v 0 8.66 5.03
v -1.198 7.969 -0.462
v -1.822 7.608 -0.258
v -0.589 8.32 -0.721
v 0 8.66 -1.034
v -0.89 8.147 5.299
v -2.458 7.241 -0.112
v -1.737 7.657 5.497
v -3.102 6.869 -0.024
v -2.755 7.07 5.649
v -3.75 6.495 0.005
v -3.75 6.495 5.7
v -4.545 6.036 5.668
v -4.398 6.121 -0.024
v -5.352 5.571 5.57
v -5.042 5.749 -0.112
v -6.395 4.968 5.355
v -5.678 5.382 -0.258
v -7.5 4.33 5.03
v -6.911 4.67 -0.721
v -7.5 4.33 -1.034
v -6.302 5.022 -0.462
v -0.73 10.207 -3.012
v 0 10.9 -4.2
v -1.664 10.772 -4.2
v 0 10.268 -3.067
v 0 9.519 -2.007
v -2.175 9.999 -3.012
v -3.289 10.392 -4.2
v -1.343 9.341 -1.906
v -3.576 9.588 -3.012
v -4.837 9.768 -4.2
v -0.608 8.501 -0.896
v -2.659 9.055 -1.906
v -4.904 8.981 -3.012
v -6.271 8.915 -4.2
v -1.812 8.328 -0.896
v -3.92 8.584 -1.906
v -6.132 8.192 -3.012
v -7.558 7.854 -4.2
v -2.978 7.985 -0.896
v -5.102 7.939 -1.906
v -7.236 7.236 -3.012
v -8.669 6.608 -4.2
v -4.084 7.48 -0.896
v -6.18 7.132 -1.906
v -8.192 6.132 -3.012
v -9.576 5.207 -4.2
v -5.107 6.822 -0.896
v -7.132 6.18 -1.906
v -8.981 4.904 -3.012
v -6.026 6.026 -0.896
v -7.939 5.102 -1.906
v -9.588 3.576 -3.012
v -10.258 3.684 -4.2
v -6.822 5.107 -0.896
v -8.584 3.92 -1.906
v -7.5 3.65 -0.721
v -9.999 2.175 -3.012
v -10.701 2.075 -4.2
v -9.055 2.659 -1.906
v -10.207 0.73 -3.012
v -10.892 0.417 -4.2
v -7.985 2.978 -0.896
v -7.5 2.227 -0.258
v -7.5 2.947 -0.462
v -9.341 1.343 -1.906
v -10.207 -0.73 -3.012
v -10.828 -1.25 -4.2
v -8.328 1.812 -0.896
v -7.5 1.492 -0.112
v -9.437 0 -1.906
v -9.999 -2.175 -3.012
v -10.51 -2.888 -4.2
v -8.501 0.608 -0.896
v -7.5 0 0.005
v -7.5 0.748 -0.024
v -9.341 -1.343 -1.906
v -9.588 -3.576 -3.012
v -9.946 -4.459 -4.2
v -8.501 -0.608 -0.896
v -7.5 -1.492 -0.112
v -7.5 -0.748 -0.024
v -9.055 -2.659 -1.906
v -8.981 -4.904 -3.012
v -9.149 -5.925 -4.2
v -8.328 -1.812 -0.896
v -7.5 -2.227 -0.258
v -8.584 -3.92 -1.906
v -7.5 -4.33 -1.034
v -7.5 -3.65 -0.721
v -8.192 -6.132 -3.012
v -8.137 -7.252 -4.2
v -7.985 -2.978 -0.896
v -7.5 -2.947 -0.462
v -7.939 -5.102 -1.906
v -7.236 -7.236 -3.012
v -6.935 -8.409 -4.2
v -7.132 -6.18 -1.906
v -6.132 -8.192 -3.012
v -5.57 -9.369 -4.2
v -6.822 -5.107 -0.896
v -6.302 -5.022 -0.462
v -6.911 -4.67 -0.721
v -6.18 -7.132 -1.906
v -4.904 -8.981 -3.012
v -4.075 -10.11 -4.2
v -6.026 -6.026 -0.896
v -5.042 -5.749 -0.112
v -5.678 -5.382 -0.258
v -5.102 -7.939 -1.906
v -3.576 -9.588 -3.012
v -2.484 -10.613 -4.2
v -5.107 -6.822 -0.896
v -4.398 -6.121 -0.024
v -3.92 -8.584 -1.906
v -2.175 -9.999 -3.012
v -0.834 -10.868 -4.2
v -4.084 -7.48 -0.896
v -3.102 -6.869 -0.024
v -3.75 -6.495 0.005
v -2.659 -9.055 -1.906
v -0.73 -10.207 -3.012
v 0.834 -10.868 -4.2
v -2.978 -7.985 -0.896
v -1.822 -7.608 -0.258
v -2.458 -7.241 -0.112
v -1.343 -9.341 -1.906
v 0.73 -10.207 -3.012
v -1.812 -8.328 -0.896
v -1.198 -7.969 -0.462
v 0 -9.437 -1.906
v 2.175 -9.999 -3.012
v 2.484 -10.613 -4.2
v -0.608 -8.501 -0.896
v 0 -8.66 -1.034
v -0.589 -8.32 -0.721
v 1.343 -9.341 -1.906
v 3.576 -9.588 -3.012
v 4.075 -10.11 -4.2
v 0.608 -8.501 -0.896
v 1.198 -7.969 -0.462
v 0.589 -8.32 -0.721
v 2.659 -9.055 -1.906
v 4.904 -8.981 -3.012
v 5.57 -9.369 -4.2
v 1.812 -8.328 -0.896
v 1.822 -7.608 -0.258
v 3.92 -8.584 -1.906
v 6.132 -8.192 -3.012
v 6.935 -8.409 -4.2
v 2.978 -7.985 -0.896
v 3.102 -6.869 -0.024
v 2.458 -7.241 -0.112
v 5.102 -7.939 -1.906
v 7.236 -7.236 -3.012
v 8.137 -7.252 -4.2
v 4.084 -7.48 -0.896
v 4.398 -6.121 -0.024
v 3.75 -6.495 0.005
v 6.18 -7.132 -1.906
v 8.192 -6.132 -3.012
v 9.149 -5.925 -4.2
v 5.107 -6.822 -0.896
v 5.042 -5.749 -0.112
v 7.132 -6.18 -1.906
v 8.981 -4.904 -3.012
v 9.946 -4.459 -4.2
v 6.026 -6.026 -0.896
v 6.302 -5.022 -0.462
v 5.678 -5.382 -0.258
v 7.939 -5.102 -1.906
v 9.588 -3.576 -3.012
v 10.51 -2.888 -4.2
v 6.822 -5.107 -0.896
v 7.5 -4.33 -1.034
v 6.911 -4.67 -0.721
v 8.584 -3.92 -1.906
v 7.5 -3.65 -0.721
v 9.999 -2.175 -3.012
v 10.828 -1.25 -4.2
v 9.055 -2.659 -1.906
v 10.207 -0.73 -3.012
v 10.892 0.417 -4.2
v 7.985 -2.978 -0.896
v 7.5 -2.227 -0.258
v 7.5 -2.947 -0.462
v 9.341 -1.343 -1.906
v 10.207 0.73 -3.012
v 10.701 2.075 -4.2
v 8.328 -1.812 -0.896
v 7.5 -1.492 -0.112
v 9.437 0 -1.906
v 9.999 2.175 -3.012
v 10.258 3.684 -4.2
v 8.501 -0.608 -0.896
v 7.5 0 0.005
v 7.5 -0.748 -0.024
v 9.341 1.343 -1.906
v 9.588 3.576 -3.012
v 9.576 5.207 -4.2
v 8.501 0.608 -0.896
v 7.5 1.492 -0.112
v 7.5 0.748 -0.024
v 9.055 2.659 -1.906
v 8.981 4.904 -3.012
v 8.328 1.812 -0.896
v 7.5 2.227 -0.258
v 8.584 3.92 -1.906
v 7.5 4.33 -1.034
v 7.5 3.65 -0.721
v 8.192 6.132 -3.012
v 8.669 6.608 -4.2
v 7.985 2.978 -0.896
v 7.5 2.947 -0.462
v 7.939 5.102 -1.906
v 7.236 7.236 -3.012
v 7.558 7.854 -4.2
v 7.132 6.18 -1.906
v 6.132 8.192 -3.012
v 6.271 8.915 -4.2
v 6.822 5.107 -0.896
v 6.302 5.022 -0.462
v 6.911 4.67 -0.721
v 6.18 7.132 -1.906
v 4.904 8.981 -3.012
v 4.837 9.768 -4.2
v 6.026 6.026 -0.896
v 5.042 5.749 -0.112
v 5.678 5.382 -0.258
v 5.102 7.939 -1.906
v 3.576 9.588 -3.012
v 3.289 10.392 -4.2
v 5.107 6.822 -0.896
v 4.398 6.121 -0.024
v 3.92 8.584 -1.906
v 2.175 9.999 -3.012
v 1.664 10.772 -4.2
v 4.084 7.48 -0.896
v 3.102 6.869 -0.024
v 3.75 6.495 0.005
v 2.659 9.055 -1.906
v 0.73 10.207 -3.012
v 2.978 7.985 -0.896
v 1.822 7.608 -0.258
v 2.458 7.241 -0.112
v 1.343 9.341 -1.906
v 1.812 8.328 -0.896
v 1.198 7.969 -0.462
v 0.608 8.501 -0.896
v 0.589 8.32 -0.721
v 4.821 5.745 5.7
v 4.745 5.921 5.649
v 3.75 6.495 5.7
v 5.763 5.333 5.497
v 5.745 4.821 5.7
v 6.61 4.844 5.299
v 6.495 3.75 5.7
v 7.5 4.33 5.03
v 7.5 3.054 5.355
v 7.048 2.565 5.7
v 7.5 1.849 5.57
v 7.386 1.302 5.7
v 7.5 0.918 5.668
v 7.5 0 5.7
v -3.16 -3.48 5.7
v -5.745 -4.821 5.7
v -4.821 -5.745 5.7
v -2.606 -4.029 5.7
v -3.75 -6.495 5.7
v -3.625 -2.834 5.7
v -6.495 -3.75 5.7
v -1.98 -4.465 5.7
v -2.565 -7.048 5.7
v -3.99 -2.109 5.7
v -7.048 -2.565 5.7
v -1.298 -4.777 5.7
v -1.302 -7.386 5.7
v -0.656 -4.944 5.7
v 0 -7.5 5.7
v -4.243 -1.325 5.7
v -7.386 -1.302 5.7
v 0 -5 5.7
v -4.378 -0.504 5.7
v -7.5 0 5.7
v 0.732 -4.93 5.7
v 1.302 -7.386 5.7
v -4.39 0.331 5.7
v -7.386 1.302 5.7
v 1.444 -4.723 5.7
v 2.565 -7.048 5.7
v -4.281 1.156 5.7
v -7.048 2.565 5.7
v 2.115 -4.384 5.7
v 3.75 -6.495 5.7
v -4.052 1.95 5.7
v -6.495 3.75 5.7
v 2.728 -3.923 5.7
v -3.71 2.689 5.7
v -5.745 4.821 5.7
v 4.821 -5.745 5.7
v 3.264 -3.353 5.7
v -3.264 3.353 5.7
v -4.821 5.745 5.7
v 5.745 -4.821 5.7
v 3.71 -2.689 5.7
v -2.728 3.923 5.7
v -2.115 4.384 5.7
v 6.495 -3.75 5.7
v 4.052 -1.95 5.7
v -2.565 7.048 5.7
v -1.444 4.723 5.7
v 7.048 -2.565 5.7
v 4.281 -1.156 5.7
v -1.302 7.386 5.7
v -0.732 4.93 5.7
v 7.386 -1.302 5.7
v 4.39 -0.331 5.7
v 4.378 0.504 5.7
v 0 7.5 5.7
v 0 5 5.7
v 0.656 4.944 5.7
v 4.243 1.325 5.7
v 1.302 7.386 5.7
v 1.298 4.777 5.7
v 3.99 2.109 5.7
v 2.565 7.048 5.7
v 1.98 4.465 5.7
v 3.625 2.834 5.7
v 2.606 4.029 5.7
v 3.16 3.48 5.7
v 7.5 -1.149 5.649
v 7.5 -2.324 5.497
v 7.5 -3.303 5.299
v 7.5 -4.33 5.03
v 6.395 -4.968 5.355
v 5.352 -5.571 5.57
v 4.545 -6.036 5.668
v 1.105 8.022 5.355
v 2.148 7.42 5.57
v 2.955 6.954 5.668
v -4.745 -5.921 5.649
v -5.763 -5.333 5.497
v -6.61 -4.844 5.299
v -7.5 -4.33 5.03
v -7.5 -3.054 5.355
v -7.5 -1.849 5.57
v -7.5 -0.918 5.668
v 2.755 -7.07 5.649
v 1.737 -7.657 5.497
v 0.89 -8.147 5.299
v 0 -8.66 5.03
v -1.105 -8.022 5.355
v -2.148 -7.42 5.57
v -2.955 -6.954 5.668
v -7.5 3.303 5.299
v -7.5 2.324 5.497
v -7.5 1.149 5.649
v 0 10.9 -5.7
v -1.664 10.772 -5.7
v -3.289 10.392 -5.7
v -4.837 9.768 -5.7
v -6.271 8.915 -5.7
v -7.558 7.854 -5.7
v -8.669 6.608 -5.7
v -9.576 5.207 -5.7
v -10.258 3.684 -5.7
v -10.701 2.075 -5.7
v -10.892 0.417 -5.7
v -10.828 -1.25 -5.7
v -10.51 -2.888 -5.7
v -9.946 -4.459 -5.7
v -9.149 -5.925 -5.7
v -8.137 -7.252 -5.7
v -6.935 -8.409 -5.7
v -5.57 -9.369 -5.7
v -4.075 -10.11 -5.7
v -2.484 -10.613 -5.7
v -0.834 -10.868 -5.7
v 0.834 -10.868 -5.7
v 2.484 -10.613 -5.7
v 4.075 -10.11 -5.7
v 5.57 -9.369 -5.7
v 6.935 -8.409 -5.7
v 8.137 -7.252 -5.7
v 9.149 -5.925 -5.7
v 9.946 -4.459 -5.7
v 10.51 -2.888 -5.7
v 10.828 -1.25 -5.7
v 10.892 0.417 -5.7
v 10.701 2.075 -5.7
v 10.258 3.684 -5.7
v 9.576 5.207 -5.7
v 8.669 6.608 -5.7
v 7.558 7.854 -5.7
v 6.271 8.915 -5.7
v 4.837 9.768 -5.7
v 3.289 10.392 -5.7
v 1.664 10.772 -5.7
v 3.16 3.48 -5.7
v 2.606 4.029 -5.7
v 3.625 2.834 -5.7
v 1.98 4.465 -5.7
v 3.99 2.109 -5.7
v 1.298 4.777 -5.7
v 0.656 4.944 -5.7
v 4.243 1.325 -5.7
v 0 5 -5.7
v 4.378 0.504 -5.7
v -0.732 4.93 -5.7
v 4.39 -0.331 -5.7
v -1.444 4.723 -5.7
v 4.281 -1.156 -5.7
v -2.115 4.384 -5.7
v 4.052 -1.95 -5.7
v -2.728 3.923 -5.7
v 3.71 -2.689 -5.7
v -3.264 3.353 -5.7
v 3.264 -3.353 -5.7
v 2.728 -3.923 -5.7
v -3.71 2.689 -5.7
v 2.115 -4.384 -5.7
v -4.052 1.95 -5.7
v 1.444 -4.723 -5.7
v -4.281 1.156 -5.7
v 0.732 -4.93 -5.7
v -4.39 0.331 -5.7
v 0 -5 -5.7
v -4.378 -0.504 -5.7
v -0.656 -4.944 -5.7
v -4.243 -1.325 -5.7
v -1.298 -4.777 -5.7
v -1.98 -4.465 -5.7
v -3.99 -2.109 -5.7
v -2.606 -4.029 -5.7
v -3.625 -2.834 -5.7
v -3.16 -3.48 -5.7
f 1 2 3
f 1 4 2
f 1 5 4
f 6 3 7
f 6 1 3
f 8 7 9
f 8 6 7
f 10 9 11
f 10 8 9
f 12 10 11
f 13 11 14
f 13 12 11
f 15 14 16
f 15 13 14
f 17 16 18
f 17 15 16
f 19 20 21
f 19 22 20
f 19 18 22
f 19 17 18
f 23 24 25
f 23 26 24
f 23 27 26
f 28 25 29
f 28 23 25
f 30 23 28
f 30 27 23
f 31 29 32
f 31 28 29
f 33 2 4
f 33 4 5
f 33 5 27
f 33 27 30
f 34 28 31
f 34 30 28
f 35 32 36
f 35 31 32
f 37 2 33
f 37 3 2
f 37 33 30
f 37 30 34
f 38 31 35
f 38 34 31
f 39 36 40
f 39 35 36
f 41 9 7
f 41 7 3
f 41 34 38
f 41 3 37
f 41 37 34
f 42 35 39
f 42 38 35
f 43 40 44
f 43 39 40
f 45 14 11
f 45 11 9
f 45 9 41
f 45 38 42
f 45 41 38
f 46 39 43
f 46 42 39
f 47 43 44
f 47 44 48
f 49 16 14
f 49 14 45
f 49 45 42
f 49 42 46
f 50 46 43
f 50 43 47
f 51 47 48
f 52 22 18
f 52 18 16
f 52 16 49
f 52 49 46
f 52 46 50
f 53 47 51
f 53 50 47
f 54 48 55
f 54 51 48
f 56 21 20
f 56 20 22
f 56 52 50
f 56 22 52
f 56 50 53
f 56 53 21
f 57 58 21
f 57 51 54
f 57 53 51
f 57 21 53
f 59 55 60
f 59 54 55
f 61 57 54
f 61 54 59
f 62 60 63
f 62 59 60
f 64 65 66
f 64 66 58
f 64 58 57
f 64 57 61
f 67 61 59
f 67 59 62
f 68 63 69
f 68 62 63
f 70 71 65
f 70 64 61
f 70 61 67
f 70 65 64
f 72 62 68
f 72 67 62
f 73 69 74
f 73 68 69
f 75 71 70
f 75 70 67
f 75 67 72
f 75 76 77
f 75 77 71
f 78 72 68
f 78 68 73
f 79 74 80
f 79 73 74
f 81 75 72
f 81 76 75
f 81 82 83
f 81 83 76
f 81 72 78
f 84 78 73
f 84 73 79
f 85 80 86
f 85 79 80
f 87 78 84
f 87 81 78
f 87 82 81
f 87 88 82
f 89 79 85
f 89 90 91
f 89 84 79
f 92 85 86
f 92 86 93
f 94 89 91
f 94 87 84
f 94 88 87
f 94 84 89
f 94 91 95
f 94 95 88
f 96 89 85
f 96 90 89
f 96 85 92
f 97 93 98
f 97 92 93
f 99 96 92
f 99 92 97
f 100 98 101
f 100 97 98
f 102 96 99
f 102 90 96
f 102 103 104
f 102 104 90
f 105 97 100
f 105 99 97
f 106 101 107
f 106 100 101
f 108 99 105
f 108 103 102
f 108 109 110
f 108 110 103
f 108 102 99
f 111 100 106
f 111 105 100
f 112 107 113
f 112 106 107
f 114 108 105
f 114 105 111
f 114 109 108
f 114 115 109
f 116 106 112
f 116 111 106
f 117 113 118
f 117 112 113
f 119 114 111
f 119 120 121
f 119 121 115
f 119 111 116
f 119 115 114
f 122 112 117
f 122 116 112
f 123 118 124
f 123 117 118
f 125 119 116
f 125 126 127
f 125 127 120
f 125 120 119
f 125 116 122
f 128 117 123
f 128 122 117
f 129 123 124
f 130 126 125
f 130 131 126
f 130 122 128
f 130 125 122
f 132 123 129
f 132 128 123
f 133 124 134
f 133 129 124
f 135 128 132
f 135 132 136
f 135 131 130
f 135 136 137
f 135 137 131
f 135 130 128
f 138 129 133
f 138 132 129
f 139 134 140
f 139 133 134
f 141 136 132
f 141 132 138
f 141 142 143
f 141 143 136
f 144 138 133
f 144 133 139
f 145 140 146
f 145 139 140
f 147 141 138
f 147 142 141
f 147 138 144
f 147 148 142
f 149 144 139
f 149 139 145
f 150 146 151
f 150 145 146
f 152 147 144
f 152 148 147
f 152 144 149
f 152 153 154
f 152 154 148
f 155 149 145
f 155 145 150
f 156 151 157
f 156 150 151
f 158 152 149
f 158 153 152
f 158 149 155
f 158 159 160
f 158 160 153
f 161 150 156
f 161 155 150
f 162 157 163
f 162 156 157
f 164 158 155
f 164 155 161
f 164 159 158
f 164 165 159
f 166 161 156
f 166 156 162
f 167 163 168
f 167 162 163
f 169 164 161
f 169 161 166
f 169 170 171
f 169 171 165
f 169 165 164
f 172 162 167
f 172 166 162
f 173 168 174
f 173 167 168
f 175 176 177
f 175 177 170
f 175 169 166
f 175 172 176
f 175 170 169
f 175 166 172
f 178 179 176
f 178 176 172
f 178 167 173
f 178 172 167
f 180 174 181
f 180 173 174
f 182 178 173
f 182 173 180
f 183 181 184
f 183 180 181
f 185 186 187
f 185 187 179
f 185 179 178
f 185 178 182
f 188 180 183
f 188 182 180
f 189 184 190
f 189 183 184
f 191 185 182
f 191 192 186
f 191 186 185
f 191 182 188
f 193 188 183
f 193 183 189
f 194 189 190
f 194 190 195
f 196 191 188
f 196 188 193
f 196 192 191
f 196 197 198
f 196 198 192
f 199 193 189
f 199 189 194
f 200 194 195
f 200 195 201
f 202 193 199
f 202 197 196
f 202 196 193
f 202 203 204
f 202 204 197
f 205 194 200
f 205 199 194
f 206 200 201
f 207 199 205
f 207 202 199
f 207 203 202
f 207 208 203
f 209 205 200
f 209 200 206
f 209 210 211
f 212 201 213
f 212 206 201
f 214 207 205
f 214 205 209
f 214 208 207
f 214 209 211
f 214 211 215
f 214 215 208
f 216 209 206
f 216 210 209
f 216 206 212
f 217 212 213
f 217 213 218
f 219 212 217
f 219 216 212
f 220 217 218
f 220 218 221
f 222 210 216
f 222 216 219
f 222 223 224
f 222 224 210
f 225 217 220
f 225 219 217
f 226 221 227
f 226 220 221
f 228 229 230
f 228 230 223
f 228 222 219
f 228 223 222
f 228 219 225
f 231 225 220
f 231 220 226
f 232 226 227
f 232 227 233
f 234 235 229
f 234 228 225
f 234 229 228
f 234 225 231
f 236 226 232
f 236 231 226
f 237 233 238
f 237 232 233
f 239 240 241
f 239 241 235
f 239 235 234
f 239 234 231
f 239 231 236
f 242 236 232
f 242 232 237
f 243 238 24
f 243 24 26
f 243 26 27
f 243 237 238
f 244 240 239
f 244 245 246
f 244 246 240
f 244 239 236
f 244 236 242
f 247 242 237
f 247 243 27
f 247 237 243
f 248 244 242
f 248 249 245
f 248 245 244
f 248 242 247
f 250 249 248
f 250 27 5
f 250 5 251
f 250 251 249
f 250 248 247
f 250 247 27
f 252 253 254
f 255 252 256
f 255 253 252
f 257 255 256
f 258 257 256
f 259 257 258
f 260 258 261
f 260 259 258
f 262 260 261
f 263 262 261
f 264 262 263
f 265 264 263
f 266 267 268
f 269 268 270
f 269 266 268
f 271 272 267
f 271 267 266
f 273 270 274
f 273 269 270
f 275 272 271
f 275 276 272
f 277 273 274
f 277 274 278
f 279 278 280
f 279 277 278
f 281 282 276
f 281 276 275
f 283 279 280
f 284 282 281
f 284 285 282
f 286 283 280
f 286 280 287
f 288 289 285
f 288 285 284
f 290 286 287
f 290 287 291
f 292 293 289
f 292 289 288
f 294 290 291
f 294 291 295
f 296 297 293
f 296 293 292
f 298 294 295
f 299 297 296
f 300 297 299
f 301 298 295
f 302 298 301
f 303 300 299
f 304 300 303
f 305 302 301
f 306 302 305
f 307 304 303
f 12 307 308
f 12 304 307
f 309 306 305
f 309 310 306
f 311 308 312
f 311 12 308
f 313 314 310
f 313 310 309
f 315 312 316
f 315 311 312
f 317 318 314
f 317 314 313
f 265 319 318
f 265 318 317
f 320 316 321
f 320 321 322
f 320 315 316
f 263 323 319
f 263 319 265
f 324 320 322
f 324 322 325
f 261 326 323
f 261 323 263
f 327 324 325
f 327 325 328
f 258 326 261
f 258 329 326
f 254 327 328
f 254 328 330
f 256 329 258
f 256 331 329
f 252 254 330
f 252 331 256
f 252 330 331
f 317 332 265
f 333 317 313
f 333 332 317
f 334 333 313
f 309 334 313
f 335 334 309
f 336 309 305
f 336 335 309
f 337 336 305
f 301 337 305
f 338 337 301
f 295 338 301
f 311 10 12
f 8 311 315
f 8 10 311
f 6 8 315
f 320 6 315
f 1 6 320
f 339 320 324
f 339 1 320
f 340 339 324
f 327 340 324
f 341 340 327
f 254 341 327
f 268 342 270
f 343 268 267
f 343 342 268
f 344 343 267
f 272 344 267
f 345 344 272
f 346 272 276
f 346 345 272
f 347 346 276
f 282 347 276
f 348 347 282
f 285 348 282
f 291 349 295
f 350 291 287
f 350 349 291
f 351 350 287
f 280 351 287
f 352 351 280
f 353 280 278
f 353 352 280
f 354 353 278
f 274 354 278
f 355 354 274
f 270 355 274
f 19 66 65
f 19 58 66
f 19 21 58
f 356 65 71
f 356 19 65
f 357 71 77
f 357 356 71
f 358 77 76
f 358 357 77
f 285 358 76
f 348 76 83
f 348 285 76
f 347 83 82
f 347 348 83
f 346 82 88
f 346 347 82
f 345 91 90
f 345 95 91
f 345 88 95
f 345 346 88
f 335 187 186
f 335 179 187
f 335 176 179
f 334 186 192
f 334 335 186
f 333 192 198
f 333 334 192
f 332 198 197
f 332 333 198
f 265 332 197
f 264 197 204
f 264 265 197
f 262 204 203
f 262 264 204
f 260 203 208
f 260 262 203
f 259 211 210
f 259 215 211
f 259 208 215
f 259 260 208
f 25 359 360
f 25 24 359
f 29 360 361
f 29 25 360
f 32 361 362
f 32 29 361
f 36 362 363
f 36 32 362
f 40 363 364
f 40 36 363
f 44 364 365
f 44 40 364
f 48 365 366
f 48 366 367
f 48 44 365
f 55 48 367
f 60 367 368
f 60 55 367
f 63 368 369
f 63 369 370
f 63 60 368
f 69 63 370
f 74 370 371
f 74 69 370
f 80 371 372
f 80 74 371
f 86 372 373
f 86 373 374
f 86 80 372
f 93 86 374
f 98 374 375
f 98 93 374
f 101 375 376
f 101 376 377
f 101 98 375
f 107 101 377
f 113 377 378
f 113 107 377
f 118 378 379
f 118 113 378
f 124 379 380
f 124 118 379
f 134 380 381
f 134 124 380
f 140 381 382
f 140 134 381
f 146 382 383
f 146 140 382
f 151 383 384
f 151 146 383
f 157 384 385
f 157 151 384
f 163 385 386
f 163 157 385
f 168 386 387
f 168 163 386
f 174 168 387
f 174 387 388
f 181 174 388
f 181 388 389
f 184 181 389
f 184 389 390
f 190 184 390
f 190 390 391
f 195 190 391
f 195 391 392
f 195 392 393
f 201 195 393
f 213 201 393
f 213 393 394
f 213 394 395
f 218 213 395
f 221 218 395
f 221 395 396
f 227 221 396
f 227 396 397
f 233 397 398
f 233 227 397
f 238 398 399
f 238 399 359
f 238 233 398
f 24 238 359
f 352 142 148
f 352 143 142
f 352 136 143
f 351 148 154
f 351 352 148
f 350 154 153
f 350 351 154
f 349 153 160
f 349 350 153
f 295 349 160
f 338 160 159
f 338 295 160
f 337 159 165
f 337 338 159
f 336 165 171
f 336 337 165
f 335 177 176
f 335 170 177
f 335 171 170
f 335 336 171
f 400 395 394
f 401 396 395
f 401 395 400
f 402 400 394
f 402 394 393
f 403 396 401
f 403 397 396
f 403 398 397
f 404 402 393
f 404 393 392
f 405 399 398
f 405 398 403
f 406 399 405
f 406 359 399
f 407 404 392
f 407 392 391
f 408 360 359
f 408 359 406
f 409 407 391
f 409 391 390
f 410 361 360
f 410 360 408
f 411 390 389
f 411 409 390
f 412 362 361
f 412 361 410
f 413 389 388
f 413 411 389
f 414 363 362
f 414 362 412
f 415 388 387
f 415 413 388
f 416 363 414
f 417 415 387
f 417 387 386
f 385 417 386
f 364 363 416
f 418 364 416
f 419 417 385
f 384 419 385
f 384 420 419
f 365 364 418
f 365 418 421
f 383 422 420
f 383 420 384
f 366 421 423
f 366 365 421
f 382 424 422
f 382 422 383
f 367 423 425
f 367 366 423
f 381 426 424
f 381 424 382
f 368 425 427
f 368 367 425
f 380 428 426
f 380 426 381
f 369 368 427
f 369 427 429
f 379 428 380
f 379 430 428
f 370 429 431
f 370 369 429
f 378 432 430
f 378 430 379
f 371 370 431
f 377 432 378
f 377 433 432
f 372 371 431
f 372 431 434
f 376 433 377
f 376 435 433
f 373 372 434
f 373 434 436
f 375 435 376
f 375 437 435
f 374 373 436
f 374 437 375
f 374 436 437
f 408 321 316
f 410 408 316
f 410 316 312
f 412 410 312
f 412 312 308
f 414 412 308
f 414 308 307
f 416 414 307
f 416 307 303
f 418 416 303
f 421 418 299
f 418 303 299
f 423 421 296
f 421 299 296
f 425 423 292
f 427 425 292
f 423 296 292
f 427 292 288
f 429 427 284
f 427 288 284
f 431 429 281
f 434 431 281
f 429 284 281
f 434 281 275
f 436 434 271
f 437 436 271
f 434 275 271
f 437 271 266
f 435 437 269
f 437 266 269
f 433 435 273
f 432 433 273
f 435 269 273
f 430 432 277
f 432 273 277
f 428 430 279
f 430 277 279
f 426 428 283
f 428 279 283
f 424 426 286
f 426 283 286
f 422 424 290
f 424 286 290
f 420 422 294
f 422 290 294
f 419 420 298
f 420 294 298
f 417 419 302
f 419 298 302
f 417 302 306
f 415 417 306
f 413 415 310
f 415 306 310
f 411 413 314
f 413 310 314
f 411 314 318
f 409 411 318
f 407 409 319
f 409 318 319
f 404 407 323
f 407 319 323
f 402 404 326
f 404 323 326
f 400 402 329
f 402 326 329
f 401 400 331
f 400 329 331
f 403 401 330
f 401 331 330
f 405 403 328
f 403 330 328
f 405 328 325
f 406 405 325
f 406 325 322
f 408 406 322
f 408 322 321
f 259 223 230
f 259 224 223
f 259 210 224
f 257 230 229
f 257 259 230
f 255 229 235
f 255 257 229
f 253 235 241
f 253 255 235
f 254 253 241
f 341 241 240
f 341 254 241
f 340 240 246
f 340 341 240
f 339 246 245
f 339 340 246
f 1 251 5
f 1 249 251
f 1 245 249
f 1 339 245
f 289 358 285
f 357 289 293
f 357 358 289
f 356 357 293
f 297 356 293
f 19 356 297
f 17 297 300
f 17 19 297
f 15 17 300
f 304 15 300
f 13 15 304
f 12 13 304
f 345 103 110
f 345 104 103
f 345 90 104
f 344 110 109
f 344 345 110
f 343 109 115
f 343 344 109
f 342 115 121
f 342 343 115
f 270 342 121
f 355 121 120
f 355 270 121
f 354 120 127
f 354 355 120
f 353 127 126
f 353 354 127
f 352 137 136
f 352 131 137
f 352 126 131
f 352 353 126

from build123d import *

# Parameters (mm, degrees)
EXTRUDE1_DEPTH      = 5.7
SKETCH2_OUTSIDE_W   = 73.328
SKETCH2_OUTSIDE_H   = 73.328
SKETCH2_OUTSIDE_R   = 7.5
CUT_EXTRUDE1_DEPTH  = 12.4
CUT_EXTRUDE1_TAPER  = 60
SKETCH5_R           = 5
CUT_EXTRUDE10_DEPTH = 12.4
SKETCH16_R          = 7.5
SKETCH16_RX         = 5
SKETCH16_RY         = 4.4
EXTRUDE2_DEPTH      = 11.4


with BuildPart() as part:
    # Sketch20 → Extrude1 (new body, symmetric)
    with BuildSketch(Plane.XY):
        Polygon((7.5, -4.330127019), (7.5, 4.330127019), (0, 8.660254038), (-7.5, 4.330127019), (-7.5, -4.330127019), (0, -8.660254038), align=None)
    extrude(amount=EXTRUDE1_DEPTH, both=True)

    # Sketch18 → Revolve1 (revolve)
    with BuildSketch(Plane(origin=(0, 0, 0), x_dir=(0, 0, -1), z_dir=(1, 0, 0))):
        with BuildLine():
            Line((5.7, 0), (5.7, 10.9))
            Line((5.7, 10.9), (4.2, 10.9))
            ThreePointArc((4.2, 10.9), (-0.760606441, 6.423589339), (-2.6, 0))
            Line((-2.6, 0), (5.7, 0))
        make_face()
    revolve(axis=Axis((0, 0, -5.7), (0, 0, 1)))

    # Sketch2 outside → Cut-Extrude1 (cut, through all)
    with BuildSketch(Plane.XY.offset(5.7)):
        Rectangle(SKETCH2_OUTSIDE_W, SKETCH2_OUTSIDE_H)
        Circle(SKETCH2_OUTSIDE_R, mode=Mode.SUBTRACT)
    extrude(amount=-CUT_EXTRUDE1_DEPTH, taper=CUT_EXTRUDE1_TAPER, mode=Mode.SUBTRACT)

    # Sketch5 → Cut-Extrude10 (cut, through all)
    with BuildSketch(Plane(origin=(0, 0, 5.7), x_dir=(-1, 0, 0), z_dir=(0, 0, -1))):
        Circle(SKETCH5_R)
    extrude(amount=CUT_EXTRUDE10_DEPTH, mode=Mode.SUBTRACT)

    # Sketch16 → Extrude2 (add)
    with BuildSketch(Plane.XY.offset(5.7)):
        Circle(SKETCH16_R)
        with Locations(Location((0, 0), (0, 0, 90))):
            Ellipse(SKETCH16_RX, SKETCH16_RY, mode=Mode.SUBTRACT)
    extrude(amount=-EXTRUDE2_DEPTH)


solid = part.part
